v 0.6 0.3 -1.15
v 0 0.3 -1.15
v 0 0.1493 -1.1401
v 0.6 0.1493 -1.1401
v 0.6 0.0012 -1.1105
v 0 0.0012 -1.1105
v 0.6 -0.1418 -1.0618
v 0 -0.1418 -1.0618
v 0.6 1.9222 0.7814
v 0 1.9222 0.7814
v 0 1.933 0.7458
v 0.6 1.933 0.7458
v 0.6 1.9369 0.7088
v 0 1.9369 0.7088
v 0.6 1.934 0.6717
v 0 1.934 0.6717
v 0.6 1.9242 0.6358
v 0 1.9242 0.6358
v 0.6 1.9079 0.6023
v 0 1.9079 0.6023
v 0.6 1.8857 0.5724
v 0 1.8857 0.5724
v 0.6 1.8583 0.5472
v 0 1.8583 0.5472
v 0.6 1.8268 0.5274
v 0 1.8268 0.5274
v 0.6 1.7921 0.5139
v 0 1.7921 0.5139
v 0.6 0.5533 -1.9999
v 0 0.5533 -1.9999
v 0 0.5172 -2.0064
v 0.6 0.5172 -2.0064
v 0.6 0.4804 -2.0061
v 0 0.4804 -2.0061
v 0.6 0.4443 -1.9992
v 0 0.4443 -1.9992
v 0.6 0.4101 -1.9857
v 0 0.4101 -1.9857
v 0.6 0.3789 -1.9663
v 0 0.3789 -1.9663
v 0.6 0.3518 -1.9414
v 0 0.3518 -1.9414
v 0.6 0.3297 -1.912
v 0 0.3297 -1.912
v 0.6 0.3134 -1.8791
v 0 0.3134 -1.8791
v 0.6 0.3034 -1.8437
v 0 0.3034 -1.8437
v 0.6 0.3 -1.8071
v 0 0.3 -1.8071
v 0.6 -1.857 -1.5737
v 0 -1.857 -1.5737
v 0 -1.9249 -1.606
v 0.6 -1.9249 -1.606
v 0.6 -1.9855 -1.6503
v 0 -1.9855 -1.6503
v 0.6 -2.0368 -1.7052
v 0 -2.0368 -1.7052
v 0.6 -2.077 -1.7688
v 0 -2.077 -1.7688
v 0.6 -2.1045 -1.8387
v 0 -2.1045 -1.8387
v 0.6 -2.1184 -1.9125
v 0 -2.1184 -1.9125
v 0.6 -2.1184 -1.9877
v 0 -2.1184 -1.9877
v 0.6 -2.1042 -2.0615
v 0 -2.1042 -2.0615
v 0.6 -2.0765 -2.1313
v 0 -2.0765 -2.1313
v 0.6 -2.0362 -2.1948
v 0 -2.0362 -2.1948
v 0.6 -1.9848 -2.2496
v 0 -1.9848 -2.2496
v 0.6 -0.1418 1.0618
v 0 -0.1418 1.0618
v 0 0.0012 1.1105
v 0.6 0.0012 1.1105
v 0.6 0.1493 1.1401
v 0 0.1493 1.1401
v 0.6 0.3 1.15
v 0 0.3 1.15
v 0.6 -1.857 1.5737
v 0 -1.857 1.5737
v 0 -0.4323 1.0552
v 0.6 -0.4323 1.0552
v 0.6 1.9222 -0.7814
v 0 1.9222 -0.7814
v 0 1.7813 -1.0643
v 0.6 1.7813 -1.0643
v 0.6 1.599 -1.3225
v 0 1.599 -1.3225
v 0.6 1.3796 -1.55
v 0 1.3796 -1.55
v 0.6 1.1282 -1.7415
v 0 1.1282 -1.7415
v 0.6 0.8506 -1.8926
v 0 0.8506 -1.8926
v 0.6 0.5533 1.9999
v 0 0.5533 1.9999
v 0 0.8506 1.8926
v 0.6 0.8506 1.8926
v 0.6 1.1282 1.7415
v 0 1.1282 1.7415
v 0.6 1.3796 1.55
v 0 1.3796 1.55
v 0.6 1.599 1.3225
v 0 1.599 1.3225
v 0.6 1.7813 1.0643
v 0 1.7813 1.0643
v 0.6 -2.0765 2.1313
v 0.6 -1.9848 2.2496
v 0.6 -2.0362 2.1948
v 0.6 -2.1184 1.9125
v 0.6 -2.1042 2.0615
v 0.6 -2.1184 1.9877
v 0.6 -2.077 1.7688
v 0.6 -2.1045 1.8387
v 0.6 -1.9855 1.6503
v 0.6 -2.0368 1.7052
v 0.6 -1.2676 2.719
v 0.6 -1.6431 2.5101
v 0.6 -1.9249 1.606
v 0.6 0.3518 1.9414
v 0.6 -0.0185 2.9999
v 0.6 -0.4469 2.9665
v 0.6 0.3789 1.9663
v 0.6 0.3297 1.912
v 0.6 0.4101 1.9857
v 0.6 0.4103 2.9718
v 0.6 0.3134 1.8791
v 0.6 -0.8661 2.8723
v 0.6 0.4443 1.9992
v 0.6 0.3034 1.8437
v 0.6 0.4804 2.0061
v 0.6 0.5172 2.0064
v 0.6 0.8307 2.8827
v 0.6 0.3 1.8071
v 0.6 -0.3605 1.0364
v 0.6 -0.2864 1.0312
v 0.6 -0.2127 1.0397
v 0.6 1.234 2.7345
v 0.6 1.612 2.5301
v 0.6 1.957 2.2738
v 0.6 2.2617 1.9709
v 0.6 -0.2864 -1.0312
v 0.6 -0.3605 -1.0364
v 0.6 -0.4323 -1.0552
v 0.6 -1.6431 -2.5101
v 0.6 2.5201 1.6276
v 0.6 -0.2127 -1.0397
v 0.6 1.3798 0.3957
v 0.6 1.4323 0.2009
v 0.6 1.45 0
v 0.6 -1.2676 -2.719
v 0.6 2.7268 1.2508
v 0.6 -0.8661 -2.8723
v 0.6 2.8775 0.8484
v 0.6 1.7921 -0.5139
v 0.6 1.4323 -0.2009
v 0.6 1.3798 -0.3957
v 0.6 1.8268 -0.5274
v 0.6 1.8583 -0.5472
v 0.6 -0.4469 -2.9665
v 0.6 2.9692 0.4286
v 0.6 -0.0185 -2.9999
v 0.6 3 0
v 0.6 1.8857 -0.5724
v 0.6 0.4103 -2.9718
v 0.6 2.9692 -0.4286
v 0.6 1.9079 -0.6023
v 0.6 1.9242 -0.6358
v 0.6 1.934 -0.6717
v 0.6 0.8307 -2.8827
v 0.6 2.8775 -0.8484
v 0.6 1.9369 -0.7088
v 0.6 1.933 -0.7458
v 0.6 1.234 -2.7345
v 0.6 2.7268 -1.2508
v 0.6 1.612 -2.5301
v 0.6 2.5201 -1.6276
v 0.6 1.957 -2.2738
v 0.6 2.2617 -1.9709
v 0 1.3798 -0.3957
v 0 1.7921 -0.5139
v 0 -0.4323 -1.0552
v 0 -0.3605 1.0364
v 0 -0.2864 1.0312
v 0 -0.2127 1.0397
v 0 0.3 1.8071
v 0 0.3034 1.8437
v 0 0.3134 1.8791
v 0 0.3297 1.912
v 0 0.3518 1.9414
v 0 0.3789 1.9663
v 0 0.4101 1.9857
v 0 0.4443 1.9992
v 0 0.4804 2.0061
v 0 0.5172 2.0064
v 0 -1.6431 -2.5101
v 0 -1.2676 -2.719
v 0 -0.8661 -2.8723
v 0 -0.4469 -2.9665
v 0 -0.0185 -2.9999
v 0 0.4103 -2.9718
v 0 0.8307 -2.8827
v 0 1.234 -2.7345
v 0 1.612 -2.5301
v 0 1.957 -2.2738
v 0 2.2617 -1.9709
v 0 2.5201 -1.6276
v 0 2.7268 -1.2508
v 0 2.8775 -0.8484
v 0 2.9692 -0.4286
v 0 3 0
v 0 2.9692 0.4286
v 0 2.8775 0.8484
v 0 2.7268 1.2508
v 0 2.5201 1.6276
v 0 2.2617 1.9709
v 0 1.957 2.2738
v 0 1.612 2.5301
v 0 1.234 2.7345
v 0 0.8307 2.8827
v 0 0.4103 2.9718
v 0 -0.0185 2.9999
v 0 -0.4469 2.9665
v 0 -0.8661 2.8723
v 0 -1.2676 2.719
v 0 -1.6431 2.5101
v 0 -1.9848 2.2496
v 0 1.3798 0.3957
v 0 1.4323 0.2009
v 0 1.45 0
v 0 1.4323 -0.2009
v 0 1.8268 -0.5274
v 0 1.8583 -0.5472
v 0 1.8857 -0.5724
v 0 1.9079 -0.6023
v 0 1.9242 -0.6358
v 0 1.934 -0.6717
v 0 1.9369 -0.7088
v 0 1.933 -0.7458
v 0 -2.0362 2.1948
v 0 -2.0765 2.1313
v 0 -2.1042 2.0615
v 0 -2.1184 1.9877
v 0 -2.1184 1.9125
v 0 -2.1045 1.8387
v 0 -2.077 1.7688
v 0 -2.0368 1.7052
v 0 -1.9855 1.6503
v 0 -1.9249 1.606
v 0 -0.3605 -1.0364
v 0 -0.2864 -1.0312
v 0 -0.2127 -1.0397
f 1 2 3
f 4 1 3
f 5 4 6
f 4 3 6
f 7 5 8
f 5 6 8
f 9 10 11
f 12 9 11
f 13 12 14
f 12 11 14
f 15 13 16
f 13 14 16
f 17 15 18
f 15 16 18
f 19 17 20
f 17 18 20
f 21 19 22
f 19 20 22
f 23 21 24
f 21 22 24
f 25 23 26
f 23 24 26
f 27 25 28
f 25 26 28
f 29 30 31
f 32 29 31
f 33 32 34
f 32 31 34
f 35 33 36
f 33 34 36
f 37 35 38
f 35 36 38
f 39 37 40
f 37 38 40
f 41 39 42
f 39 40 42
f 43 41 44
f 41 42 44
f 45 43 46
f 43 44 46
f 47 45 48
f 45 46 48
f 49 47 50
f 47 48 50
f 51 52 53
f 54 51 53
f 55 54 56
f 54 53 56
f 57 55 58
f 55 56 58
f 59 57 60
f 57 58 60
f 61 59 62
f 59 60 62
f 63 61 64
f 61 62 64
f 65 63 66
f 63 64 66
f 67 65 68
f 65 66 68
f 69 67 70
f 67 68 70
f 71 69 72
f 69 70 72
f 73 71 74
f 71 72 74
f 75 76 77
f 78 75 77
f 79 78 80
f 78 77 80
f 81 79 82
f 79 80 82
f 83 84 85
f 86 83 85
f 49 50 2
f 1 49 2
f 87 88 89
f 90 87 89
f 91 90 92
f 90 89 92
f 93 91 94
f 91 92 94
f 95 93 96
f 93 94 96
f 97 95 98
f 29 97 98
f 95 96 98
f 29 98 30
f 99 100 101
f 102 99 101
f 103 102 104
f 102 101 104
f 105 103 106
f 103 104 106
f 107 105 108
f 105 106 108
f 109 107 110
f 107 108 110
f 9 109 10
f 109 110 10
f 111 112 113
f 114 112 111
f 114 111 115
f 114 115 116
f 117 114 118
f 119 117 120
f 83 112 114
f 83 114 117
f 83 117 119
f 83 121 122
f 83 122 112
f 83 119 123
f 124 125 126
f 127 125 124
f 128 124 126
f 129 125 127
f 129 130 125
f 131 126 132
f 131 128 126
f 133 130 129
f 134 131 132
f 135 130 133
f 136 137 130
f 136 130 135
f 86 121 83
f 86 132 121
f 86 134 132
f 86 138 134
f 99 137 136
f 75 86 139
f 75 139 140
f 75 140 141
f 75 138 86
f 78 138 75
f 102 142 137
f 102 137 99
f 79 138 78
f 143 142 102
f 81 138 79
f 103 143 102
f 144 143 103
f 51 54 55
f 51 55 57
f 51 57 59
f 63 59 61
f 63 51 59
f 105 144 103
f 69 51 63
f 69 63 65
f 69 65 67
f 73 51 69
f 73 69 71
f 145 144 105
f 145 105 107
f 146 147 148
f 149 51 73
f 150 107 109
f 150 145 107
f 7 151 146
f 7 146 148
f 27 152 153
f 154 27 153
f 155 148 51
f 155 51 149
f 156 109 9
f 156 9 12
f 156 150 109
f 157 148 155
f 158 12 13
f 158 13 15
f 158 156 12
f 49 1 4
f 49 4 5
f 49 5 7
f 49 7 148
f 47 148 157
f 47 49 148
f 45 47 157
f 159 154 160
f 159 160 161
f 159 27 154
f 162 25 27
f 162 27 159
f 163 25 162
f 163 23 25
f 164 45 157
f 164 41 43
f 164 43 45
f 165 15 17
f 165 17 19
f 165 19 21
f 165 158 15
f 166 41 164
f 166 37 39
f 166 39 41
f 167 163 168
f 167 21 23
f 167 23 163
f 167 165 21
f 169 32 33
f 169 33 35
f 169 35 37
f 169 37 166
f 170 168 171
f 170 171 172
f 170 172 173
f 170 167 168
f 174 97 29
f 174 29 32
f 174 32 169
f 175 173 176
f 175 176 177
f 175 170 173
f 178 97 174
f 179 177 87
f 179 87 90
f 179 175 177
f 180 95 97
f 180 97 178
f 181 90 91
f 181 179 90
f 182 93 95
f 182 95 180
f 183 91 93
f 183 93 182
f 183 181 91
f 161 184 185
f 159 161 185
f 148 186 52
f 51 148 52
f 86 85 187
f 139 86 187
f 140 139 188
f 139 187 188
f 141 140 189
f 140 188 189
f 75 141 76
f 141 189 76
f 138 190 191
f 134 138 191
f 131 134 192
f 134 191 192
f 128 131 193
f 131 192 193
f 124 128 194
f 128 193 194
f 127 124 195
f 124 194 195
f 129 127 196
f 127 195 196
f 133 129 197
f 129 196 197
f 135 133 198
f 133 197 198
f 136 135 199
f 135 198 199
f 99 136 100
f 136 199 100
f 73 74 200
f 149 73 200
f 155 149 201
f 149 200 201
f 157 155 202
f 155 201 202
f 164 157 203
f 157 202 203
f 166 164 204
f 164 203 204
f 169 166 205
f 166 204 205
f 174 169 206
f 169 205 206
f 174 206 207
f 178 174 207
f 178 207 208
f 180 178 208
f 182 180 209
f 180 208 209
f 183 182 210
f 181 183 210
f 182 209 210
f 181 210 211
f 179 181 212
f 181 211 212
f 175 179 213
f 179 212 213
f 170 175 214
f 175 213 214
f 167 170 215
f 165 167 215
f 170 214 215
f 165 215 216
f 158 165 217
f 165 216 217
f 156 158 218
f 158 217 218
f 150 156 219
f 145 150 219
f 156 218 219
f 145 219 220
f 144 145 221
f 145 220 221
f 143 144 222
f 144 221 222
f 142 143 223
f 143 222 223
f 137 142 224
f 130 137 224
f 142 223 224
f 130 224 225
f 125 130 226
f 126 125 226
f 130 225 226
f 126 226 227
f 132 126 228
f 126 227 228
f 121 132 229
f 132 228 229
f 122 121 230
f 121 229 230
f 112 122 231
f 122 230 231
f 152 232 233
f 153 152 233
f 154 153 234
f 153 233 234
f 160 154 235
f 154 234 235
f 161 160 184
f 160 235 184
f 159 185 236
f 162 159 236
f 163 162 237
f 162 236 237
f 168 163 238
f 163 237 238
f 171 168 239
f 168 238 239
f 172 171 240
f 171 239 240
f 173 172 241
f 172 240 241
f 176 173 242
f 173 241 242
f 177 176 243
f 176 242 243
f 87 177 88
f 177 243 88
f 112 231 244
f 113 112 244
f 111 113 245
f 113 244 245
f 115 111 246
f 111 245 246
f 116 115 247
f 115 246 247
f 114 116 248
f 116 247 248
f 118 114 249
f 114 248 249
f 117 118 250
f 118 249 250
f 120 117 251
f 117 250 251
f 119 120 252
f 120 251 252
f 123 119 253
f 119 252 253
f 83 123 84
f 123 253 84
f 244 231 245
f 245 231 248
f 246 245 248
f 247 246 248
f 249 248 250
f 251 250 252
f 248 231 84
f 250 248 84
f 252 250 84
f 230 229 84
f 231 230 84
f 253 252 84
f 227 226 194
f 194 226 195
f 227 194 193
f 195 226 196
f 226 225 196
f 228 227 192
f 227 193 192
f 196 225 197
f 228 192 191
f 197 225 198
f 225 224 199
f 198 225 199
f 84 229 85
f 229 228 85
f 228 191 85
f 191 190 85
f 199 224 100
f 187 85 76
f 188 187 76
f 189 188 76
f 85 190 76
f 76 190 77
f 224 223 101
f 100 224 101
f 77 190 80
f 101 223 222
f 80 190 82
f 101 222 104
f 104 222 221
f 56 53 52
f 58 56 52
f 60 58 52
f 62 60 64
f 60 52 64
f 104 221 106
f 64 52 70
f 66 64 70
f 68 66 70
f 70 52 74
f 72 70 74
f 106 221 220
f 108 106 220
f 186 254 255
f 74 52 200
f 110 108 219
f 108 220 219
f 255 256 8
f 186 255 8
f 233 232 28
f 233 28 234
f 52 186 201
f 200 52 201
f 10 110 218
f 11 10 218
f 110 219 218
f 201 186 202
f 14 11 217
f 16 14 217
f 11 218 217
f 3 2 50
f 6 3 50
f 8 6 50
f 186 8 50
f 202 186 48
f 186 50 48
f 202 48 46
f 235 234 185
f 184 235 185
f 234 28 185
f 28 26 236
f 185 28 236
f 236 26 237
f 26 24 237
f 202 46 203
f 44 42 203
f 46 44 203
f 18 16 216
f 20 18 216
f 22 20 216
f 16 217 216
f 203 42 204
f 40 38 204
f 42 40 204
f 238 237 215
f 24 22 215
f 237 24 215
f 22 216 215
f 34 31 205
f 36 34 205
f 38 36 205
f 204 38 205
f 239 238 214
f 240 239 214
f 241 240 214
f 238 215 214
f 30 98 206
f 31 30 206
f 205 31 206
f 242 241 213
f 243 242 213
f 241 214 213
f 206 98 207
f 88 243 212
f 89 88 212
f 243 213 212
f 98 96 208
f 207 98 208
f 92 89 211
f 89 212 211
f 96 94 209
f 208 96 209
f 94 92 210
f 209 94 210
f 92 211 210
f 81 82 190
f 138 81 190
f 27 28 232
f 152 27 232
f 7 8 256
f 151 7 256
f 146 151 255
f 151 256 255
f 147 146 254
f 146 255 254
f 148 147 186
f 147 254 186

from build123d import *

# Parameters (mm, degrees)
BASE_EXTRUSION_DEPTH = 0.6


with BuildPart() as part:
    # Esquisse1 → Base-Extrusion (new body)
    with BuildSketch(Plane(origin=(0, 0, 0), x_dir=(0, 0, -1), z_dir=(1, 0, 0))):
        with BuildLine():
            Line((0.395650325, 1.379796657), (0.513871499, 1.792082889))
            ThreePointArc((0.513871499, 1.792082889), (0.618642921, 1.916808383), (0.781443715, 1.922230663))
            ThreePointArc((0.781443715, 1.922230663), (1.549962924, 1.379579622), (1.999861801, 0.553333333))
            ThreePointArc((1.999861801, 0.553333333), (1.966268522, 0.378893986), (1.807104037, 0.3))
            Line((1.807104037, 0.3), (1.15, 0.3))
            ThreePointArc((1.15, 0.3), (1.127723116, 0.074743316), (1.061755524, -0.141786383))
            ThreePointArc((1.061755524, -0.141786383), (1.031164095, -0.286405137), (1.055184744, -0.432259269))
            Line((1.055184744, -0.432259269), (1.573740622, -1.856979833))
            ThreePointArc((1.573740622, -1.856979833), (1.875274337, -2.113202397), (2.249558851, -1.984813588))
            ThreePointArc((2.249558851, -1.984813588), (0, 3), (-2.249558851, -1.984813588))
            ThreePointArc((-2.249558851, -1.984813588), (-1.875274337, -2.113202397), (-1.573740622, -1.856979833))
            Line((-1.573740622, -1.856979833), (-1.055184744, -0.432259269))
            ThreePointArc((-1.055184744, -0.432259269), (-1.031164095, -0.286405137), (-1.061755524, -0.141786383))
            ThreePointArc((-1.061755524, -0.141786383), (-1.127723116, 0.074743316), (-1.15, 0.3))
            Line((-1.15, 0.3), (-1.807104037, 0.3))
            ThreePointArc((-1.807104037, 0.3), (-1.966268522, 0.378893986), (-1.999861801, 0.553333333))
            ThreePointArc((-1.999861801, 0.553333333), (-1.549962924, 1.379579622), (-0.781443715, 1.922230663))
            ThreePointArc((-0.781443715, 1.922230663), (-0.618642921, 1.916808383), (-0.513871499, 1.792082889))
            Line((-0.513871499, 1.792082889), (-0.395650325, 1.379796657))
            ThreePointArc((-0.395650325, 1.379796657), (0, 1.45), (0.395650325, 1.379796657))
        make_face()
    extrude(amount=BASE_EXTRUSION_DEPTH)


solid = part.part
